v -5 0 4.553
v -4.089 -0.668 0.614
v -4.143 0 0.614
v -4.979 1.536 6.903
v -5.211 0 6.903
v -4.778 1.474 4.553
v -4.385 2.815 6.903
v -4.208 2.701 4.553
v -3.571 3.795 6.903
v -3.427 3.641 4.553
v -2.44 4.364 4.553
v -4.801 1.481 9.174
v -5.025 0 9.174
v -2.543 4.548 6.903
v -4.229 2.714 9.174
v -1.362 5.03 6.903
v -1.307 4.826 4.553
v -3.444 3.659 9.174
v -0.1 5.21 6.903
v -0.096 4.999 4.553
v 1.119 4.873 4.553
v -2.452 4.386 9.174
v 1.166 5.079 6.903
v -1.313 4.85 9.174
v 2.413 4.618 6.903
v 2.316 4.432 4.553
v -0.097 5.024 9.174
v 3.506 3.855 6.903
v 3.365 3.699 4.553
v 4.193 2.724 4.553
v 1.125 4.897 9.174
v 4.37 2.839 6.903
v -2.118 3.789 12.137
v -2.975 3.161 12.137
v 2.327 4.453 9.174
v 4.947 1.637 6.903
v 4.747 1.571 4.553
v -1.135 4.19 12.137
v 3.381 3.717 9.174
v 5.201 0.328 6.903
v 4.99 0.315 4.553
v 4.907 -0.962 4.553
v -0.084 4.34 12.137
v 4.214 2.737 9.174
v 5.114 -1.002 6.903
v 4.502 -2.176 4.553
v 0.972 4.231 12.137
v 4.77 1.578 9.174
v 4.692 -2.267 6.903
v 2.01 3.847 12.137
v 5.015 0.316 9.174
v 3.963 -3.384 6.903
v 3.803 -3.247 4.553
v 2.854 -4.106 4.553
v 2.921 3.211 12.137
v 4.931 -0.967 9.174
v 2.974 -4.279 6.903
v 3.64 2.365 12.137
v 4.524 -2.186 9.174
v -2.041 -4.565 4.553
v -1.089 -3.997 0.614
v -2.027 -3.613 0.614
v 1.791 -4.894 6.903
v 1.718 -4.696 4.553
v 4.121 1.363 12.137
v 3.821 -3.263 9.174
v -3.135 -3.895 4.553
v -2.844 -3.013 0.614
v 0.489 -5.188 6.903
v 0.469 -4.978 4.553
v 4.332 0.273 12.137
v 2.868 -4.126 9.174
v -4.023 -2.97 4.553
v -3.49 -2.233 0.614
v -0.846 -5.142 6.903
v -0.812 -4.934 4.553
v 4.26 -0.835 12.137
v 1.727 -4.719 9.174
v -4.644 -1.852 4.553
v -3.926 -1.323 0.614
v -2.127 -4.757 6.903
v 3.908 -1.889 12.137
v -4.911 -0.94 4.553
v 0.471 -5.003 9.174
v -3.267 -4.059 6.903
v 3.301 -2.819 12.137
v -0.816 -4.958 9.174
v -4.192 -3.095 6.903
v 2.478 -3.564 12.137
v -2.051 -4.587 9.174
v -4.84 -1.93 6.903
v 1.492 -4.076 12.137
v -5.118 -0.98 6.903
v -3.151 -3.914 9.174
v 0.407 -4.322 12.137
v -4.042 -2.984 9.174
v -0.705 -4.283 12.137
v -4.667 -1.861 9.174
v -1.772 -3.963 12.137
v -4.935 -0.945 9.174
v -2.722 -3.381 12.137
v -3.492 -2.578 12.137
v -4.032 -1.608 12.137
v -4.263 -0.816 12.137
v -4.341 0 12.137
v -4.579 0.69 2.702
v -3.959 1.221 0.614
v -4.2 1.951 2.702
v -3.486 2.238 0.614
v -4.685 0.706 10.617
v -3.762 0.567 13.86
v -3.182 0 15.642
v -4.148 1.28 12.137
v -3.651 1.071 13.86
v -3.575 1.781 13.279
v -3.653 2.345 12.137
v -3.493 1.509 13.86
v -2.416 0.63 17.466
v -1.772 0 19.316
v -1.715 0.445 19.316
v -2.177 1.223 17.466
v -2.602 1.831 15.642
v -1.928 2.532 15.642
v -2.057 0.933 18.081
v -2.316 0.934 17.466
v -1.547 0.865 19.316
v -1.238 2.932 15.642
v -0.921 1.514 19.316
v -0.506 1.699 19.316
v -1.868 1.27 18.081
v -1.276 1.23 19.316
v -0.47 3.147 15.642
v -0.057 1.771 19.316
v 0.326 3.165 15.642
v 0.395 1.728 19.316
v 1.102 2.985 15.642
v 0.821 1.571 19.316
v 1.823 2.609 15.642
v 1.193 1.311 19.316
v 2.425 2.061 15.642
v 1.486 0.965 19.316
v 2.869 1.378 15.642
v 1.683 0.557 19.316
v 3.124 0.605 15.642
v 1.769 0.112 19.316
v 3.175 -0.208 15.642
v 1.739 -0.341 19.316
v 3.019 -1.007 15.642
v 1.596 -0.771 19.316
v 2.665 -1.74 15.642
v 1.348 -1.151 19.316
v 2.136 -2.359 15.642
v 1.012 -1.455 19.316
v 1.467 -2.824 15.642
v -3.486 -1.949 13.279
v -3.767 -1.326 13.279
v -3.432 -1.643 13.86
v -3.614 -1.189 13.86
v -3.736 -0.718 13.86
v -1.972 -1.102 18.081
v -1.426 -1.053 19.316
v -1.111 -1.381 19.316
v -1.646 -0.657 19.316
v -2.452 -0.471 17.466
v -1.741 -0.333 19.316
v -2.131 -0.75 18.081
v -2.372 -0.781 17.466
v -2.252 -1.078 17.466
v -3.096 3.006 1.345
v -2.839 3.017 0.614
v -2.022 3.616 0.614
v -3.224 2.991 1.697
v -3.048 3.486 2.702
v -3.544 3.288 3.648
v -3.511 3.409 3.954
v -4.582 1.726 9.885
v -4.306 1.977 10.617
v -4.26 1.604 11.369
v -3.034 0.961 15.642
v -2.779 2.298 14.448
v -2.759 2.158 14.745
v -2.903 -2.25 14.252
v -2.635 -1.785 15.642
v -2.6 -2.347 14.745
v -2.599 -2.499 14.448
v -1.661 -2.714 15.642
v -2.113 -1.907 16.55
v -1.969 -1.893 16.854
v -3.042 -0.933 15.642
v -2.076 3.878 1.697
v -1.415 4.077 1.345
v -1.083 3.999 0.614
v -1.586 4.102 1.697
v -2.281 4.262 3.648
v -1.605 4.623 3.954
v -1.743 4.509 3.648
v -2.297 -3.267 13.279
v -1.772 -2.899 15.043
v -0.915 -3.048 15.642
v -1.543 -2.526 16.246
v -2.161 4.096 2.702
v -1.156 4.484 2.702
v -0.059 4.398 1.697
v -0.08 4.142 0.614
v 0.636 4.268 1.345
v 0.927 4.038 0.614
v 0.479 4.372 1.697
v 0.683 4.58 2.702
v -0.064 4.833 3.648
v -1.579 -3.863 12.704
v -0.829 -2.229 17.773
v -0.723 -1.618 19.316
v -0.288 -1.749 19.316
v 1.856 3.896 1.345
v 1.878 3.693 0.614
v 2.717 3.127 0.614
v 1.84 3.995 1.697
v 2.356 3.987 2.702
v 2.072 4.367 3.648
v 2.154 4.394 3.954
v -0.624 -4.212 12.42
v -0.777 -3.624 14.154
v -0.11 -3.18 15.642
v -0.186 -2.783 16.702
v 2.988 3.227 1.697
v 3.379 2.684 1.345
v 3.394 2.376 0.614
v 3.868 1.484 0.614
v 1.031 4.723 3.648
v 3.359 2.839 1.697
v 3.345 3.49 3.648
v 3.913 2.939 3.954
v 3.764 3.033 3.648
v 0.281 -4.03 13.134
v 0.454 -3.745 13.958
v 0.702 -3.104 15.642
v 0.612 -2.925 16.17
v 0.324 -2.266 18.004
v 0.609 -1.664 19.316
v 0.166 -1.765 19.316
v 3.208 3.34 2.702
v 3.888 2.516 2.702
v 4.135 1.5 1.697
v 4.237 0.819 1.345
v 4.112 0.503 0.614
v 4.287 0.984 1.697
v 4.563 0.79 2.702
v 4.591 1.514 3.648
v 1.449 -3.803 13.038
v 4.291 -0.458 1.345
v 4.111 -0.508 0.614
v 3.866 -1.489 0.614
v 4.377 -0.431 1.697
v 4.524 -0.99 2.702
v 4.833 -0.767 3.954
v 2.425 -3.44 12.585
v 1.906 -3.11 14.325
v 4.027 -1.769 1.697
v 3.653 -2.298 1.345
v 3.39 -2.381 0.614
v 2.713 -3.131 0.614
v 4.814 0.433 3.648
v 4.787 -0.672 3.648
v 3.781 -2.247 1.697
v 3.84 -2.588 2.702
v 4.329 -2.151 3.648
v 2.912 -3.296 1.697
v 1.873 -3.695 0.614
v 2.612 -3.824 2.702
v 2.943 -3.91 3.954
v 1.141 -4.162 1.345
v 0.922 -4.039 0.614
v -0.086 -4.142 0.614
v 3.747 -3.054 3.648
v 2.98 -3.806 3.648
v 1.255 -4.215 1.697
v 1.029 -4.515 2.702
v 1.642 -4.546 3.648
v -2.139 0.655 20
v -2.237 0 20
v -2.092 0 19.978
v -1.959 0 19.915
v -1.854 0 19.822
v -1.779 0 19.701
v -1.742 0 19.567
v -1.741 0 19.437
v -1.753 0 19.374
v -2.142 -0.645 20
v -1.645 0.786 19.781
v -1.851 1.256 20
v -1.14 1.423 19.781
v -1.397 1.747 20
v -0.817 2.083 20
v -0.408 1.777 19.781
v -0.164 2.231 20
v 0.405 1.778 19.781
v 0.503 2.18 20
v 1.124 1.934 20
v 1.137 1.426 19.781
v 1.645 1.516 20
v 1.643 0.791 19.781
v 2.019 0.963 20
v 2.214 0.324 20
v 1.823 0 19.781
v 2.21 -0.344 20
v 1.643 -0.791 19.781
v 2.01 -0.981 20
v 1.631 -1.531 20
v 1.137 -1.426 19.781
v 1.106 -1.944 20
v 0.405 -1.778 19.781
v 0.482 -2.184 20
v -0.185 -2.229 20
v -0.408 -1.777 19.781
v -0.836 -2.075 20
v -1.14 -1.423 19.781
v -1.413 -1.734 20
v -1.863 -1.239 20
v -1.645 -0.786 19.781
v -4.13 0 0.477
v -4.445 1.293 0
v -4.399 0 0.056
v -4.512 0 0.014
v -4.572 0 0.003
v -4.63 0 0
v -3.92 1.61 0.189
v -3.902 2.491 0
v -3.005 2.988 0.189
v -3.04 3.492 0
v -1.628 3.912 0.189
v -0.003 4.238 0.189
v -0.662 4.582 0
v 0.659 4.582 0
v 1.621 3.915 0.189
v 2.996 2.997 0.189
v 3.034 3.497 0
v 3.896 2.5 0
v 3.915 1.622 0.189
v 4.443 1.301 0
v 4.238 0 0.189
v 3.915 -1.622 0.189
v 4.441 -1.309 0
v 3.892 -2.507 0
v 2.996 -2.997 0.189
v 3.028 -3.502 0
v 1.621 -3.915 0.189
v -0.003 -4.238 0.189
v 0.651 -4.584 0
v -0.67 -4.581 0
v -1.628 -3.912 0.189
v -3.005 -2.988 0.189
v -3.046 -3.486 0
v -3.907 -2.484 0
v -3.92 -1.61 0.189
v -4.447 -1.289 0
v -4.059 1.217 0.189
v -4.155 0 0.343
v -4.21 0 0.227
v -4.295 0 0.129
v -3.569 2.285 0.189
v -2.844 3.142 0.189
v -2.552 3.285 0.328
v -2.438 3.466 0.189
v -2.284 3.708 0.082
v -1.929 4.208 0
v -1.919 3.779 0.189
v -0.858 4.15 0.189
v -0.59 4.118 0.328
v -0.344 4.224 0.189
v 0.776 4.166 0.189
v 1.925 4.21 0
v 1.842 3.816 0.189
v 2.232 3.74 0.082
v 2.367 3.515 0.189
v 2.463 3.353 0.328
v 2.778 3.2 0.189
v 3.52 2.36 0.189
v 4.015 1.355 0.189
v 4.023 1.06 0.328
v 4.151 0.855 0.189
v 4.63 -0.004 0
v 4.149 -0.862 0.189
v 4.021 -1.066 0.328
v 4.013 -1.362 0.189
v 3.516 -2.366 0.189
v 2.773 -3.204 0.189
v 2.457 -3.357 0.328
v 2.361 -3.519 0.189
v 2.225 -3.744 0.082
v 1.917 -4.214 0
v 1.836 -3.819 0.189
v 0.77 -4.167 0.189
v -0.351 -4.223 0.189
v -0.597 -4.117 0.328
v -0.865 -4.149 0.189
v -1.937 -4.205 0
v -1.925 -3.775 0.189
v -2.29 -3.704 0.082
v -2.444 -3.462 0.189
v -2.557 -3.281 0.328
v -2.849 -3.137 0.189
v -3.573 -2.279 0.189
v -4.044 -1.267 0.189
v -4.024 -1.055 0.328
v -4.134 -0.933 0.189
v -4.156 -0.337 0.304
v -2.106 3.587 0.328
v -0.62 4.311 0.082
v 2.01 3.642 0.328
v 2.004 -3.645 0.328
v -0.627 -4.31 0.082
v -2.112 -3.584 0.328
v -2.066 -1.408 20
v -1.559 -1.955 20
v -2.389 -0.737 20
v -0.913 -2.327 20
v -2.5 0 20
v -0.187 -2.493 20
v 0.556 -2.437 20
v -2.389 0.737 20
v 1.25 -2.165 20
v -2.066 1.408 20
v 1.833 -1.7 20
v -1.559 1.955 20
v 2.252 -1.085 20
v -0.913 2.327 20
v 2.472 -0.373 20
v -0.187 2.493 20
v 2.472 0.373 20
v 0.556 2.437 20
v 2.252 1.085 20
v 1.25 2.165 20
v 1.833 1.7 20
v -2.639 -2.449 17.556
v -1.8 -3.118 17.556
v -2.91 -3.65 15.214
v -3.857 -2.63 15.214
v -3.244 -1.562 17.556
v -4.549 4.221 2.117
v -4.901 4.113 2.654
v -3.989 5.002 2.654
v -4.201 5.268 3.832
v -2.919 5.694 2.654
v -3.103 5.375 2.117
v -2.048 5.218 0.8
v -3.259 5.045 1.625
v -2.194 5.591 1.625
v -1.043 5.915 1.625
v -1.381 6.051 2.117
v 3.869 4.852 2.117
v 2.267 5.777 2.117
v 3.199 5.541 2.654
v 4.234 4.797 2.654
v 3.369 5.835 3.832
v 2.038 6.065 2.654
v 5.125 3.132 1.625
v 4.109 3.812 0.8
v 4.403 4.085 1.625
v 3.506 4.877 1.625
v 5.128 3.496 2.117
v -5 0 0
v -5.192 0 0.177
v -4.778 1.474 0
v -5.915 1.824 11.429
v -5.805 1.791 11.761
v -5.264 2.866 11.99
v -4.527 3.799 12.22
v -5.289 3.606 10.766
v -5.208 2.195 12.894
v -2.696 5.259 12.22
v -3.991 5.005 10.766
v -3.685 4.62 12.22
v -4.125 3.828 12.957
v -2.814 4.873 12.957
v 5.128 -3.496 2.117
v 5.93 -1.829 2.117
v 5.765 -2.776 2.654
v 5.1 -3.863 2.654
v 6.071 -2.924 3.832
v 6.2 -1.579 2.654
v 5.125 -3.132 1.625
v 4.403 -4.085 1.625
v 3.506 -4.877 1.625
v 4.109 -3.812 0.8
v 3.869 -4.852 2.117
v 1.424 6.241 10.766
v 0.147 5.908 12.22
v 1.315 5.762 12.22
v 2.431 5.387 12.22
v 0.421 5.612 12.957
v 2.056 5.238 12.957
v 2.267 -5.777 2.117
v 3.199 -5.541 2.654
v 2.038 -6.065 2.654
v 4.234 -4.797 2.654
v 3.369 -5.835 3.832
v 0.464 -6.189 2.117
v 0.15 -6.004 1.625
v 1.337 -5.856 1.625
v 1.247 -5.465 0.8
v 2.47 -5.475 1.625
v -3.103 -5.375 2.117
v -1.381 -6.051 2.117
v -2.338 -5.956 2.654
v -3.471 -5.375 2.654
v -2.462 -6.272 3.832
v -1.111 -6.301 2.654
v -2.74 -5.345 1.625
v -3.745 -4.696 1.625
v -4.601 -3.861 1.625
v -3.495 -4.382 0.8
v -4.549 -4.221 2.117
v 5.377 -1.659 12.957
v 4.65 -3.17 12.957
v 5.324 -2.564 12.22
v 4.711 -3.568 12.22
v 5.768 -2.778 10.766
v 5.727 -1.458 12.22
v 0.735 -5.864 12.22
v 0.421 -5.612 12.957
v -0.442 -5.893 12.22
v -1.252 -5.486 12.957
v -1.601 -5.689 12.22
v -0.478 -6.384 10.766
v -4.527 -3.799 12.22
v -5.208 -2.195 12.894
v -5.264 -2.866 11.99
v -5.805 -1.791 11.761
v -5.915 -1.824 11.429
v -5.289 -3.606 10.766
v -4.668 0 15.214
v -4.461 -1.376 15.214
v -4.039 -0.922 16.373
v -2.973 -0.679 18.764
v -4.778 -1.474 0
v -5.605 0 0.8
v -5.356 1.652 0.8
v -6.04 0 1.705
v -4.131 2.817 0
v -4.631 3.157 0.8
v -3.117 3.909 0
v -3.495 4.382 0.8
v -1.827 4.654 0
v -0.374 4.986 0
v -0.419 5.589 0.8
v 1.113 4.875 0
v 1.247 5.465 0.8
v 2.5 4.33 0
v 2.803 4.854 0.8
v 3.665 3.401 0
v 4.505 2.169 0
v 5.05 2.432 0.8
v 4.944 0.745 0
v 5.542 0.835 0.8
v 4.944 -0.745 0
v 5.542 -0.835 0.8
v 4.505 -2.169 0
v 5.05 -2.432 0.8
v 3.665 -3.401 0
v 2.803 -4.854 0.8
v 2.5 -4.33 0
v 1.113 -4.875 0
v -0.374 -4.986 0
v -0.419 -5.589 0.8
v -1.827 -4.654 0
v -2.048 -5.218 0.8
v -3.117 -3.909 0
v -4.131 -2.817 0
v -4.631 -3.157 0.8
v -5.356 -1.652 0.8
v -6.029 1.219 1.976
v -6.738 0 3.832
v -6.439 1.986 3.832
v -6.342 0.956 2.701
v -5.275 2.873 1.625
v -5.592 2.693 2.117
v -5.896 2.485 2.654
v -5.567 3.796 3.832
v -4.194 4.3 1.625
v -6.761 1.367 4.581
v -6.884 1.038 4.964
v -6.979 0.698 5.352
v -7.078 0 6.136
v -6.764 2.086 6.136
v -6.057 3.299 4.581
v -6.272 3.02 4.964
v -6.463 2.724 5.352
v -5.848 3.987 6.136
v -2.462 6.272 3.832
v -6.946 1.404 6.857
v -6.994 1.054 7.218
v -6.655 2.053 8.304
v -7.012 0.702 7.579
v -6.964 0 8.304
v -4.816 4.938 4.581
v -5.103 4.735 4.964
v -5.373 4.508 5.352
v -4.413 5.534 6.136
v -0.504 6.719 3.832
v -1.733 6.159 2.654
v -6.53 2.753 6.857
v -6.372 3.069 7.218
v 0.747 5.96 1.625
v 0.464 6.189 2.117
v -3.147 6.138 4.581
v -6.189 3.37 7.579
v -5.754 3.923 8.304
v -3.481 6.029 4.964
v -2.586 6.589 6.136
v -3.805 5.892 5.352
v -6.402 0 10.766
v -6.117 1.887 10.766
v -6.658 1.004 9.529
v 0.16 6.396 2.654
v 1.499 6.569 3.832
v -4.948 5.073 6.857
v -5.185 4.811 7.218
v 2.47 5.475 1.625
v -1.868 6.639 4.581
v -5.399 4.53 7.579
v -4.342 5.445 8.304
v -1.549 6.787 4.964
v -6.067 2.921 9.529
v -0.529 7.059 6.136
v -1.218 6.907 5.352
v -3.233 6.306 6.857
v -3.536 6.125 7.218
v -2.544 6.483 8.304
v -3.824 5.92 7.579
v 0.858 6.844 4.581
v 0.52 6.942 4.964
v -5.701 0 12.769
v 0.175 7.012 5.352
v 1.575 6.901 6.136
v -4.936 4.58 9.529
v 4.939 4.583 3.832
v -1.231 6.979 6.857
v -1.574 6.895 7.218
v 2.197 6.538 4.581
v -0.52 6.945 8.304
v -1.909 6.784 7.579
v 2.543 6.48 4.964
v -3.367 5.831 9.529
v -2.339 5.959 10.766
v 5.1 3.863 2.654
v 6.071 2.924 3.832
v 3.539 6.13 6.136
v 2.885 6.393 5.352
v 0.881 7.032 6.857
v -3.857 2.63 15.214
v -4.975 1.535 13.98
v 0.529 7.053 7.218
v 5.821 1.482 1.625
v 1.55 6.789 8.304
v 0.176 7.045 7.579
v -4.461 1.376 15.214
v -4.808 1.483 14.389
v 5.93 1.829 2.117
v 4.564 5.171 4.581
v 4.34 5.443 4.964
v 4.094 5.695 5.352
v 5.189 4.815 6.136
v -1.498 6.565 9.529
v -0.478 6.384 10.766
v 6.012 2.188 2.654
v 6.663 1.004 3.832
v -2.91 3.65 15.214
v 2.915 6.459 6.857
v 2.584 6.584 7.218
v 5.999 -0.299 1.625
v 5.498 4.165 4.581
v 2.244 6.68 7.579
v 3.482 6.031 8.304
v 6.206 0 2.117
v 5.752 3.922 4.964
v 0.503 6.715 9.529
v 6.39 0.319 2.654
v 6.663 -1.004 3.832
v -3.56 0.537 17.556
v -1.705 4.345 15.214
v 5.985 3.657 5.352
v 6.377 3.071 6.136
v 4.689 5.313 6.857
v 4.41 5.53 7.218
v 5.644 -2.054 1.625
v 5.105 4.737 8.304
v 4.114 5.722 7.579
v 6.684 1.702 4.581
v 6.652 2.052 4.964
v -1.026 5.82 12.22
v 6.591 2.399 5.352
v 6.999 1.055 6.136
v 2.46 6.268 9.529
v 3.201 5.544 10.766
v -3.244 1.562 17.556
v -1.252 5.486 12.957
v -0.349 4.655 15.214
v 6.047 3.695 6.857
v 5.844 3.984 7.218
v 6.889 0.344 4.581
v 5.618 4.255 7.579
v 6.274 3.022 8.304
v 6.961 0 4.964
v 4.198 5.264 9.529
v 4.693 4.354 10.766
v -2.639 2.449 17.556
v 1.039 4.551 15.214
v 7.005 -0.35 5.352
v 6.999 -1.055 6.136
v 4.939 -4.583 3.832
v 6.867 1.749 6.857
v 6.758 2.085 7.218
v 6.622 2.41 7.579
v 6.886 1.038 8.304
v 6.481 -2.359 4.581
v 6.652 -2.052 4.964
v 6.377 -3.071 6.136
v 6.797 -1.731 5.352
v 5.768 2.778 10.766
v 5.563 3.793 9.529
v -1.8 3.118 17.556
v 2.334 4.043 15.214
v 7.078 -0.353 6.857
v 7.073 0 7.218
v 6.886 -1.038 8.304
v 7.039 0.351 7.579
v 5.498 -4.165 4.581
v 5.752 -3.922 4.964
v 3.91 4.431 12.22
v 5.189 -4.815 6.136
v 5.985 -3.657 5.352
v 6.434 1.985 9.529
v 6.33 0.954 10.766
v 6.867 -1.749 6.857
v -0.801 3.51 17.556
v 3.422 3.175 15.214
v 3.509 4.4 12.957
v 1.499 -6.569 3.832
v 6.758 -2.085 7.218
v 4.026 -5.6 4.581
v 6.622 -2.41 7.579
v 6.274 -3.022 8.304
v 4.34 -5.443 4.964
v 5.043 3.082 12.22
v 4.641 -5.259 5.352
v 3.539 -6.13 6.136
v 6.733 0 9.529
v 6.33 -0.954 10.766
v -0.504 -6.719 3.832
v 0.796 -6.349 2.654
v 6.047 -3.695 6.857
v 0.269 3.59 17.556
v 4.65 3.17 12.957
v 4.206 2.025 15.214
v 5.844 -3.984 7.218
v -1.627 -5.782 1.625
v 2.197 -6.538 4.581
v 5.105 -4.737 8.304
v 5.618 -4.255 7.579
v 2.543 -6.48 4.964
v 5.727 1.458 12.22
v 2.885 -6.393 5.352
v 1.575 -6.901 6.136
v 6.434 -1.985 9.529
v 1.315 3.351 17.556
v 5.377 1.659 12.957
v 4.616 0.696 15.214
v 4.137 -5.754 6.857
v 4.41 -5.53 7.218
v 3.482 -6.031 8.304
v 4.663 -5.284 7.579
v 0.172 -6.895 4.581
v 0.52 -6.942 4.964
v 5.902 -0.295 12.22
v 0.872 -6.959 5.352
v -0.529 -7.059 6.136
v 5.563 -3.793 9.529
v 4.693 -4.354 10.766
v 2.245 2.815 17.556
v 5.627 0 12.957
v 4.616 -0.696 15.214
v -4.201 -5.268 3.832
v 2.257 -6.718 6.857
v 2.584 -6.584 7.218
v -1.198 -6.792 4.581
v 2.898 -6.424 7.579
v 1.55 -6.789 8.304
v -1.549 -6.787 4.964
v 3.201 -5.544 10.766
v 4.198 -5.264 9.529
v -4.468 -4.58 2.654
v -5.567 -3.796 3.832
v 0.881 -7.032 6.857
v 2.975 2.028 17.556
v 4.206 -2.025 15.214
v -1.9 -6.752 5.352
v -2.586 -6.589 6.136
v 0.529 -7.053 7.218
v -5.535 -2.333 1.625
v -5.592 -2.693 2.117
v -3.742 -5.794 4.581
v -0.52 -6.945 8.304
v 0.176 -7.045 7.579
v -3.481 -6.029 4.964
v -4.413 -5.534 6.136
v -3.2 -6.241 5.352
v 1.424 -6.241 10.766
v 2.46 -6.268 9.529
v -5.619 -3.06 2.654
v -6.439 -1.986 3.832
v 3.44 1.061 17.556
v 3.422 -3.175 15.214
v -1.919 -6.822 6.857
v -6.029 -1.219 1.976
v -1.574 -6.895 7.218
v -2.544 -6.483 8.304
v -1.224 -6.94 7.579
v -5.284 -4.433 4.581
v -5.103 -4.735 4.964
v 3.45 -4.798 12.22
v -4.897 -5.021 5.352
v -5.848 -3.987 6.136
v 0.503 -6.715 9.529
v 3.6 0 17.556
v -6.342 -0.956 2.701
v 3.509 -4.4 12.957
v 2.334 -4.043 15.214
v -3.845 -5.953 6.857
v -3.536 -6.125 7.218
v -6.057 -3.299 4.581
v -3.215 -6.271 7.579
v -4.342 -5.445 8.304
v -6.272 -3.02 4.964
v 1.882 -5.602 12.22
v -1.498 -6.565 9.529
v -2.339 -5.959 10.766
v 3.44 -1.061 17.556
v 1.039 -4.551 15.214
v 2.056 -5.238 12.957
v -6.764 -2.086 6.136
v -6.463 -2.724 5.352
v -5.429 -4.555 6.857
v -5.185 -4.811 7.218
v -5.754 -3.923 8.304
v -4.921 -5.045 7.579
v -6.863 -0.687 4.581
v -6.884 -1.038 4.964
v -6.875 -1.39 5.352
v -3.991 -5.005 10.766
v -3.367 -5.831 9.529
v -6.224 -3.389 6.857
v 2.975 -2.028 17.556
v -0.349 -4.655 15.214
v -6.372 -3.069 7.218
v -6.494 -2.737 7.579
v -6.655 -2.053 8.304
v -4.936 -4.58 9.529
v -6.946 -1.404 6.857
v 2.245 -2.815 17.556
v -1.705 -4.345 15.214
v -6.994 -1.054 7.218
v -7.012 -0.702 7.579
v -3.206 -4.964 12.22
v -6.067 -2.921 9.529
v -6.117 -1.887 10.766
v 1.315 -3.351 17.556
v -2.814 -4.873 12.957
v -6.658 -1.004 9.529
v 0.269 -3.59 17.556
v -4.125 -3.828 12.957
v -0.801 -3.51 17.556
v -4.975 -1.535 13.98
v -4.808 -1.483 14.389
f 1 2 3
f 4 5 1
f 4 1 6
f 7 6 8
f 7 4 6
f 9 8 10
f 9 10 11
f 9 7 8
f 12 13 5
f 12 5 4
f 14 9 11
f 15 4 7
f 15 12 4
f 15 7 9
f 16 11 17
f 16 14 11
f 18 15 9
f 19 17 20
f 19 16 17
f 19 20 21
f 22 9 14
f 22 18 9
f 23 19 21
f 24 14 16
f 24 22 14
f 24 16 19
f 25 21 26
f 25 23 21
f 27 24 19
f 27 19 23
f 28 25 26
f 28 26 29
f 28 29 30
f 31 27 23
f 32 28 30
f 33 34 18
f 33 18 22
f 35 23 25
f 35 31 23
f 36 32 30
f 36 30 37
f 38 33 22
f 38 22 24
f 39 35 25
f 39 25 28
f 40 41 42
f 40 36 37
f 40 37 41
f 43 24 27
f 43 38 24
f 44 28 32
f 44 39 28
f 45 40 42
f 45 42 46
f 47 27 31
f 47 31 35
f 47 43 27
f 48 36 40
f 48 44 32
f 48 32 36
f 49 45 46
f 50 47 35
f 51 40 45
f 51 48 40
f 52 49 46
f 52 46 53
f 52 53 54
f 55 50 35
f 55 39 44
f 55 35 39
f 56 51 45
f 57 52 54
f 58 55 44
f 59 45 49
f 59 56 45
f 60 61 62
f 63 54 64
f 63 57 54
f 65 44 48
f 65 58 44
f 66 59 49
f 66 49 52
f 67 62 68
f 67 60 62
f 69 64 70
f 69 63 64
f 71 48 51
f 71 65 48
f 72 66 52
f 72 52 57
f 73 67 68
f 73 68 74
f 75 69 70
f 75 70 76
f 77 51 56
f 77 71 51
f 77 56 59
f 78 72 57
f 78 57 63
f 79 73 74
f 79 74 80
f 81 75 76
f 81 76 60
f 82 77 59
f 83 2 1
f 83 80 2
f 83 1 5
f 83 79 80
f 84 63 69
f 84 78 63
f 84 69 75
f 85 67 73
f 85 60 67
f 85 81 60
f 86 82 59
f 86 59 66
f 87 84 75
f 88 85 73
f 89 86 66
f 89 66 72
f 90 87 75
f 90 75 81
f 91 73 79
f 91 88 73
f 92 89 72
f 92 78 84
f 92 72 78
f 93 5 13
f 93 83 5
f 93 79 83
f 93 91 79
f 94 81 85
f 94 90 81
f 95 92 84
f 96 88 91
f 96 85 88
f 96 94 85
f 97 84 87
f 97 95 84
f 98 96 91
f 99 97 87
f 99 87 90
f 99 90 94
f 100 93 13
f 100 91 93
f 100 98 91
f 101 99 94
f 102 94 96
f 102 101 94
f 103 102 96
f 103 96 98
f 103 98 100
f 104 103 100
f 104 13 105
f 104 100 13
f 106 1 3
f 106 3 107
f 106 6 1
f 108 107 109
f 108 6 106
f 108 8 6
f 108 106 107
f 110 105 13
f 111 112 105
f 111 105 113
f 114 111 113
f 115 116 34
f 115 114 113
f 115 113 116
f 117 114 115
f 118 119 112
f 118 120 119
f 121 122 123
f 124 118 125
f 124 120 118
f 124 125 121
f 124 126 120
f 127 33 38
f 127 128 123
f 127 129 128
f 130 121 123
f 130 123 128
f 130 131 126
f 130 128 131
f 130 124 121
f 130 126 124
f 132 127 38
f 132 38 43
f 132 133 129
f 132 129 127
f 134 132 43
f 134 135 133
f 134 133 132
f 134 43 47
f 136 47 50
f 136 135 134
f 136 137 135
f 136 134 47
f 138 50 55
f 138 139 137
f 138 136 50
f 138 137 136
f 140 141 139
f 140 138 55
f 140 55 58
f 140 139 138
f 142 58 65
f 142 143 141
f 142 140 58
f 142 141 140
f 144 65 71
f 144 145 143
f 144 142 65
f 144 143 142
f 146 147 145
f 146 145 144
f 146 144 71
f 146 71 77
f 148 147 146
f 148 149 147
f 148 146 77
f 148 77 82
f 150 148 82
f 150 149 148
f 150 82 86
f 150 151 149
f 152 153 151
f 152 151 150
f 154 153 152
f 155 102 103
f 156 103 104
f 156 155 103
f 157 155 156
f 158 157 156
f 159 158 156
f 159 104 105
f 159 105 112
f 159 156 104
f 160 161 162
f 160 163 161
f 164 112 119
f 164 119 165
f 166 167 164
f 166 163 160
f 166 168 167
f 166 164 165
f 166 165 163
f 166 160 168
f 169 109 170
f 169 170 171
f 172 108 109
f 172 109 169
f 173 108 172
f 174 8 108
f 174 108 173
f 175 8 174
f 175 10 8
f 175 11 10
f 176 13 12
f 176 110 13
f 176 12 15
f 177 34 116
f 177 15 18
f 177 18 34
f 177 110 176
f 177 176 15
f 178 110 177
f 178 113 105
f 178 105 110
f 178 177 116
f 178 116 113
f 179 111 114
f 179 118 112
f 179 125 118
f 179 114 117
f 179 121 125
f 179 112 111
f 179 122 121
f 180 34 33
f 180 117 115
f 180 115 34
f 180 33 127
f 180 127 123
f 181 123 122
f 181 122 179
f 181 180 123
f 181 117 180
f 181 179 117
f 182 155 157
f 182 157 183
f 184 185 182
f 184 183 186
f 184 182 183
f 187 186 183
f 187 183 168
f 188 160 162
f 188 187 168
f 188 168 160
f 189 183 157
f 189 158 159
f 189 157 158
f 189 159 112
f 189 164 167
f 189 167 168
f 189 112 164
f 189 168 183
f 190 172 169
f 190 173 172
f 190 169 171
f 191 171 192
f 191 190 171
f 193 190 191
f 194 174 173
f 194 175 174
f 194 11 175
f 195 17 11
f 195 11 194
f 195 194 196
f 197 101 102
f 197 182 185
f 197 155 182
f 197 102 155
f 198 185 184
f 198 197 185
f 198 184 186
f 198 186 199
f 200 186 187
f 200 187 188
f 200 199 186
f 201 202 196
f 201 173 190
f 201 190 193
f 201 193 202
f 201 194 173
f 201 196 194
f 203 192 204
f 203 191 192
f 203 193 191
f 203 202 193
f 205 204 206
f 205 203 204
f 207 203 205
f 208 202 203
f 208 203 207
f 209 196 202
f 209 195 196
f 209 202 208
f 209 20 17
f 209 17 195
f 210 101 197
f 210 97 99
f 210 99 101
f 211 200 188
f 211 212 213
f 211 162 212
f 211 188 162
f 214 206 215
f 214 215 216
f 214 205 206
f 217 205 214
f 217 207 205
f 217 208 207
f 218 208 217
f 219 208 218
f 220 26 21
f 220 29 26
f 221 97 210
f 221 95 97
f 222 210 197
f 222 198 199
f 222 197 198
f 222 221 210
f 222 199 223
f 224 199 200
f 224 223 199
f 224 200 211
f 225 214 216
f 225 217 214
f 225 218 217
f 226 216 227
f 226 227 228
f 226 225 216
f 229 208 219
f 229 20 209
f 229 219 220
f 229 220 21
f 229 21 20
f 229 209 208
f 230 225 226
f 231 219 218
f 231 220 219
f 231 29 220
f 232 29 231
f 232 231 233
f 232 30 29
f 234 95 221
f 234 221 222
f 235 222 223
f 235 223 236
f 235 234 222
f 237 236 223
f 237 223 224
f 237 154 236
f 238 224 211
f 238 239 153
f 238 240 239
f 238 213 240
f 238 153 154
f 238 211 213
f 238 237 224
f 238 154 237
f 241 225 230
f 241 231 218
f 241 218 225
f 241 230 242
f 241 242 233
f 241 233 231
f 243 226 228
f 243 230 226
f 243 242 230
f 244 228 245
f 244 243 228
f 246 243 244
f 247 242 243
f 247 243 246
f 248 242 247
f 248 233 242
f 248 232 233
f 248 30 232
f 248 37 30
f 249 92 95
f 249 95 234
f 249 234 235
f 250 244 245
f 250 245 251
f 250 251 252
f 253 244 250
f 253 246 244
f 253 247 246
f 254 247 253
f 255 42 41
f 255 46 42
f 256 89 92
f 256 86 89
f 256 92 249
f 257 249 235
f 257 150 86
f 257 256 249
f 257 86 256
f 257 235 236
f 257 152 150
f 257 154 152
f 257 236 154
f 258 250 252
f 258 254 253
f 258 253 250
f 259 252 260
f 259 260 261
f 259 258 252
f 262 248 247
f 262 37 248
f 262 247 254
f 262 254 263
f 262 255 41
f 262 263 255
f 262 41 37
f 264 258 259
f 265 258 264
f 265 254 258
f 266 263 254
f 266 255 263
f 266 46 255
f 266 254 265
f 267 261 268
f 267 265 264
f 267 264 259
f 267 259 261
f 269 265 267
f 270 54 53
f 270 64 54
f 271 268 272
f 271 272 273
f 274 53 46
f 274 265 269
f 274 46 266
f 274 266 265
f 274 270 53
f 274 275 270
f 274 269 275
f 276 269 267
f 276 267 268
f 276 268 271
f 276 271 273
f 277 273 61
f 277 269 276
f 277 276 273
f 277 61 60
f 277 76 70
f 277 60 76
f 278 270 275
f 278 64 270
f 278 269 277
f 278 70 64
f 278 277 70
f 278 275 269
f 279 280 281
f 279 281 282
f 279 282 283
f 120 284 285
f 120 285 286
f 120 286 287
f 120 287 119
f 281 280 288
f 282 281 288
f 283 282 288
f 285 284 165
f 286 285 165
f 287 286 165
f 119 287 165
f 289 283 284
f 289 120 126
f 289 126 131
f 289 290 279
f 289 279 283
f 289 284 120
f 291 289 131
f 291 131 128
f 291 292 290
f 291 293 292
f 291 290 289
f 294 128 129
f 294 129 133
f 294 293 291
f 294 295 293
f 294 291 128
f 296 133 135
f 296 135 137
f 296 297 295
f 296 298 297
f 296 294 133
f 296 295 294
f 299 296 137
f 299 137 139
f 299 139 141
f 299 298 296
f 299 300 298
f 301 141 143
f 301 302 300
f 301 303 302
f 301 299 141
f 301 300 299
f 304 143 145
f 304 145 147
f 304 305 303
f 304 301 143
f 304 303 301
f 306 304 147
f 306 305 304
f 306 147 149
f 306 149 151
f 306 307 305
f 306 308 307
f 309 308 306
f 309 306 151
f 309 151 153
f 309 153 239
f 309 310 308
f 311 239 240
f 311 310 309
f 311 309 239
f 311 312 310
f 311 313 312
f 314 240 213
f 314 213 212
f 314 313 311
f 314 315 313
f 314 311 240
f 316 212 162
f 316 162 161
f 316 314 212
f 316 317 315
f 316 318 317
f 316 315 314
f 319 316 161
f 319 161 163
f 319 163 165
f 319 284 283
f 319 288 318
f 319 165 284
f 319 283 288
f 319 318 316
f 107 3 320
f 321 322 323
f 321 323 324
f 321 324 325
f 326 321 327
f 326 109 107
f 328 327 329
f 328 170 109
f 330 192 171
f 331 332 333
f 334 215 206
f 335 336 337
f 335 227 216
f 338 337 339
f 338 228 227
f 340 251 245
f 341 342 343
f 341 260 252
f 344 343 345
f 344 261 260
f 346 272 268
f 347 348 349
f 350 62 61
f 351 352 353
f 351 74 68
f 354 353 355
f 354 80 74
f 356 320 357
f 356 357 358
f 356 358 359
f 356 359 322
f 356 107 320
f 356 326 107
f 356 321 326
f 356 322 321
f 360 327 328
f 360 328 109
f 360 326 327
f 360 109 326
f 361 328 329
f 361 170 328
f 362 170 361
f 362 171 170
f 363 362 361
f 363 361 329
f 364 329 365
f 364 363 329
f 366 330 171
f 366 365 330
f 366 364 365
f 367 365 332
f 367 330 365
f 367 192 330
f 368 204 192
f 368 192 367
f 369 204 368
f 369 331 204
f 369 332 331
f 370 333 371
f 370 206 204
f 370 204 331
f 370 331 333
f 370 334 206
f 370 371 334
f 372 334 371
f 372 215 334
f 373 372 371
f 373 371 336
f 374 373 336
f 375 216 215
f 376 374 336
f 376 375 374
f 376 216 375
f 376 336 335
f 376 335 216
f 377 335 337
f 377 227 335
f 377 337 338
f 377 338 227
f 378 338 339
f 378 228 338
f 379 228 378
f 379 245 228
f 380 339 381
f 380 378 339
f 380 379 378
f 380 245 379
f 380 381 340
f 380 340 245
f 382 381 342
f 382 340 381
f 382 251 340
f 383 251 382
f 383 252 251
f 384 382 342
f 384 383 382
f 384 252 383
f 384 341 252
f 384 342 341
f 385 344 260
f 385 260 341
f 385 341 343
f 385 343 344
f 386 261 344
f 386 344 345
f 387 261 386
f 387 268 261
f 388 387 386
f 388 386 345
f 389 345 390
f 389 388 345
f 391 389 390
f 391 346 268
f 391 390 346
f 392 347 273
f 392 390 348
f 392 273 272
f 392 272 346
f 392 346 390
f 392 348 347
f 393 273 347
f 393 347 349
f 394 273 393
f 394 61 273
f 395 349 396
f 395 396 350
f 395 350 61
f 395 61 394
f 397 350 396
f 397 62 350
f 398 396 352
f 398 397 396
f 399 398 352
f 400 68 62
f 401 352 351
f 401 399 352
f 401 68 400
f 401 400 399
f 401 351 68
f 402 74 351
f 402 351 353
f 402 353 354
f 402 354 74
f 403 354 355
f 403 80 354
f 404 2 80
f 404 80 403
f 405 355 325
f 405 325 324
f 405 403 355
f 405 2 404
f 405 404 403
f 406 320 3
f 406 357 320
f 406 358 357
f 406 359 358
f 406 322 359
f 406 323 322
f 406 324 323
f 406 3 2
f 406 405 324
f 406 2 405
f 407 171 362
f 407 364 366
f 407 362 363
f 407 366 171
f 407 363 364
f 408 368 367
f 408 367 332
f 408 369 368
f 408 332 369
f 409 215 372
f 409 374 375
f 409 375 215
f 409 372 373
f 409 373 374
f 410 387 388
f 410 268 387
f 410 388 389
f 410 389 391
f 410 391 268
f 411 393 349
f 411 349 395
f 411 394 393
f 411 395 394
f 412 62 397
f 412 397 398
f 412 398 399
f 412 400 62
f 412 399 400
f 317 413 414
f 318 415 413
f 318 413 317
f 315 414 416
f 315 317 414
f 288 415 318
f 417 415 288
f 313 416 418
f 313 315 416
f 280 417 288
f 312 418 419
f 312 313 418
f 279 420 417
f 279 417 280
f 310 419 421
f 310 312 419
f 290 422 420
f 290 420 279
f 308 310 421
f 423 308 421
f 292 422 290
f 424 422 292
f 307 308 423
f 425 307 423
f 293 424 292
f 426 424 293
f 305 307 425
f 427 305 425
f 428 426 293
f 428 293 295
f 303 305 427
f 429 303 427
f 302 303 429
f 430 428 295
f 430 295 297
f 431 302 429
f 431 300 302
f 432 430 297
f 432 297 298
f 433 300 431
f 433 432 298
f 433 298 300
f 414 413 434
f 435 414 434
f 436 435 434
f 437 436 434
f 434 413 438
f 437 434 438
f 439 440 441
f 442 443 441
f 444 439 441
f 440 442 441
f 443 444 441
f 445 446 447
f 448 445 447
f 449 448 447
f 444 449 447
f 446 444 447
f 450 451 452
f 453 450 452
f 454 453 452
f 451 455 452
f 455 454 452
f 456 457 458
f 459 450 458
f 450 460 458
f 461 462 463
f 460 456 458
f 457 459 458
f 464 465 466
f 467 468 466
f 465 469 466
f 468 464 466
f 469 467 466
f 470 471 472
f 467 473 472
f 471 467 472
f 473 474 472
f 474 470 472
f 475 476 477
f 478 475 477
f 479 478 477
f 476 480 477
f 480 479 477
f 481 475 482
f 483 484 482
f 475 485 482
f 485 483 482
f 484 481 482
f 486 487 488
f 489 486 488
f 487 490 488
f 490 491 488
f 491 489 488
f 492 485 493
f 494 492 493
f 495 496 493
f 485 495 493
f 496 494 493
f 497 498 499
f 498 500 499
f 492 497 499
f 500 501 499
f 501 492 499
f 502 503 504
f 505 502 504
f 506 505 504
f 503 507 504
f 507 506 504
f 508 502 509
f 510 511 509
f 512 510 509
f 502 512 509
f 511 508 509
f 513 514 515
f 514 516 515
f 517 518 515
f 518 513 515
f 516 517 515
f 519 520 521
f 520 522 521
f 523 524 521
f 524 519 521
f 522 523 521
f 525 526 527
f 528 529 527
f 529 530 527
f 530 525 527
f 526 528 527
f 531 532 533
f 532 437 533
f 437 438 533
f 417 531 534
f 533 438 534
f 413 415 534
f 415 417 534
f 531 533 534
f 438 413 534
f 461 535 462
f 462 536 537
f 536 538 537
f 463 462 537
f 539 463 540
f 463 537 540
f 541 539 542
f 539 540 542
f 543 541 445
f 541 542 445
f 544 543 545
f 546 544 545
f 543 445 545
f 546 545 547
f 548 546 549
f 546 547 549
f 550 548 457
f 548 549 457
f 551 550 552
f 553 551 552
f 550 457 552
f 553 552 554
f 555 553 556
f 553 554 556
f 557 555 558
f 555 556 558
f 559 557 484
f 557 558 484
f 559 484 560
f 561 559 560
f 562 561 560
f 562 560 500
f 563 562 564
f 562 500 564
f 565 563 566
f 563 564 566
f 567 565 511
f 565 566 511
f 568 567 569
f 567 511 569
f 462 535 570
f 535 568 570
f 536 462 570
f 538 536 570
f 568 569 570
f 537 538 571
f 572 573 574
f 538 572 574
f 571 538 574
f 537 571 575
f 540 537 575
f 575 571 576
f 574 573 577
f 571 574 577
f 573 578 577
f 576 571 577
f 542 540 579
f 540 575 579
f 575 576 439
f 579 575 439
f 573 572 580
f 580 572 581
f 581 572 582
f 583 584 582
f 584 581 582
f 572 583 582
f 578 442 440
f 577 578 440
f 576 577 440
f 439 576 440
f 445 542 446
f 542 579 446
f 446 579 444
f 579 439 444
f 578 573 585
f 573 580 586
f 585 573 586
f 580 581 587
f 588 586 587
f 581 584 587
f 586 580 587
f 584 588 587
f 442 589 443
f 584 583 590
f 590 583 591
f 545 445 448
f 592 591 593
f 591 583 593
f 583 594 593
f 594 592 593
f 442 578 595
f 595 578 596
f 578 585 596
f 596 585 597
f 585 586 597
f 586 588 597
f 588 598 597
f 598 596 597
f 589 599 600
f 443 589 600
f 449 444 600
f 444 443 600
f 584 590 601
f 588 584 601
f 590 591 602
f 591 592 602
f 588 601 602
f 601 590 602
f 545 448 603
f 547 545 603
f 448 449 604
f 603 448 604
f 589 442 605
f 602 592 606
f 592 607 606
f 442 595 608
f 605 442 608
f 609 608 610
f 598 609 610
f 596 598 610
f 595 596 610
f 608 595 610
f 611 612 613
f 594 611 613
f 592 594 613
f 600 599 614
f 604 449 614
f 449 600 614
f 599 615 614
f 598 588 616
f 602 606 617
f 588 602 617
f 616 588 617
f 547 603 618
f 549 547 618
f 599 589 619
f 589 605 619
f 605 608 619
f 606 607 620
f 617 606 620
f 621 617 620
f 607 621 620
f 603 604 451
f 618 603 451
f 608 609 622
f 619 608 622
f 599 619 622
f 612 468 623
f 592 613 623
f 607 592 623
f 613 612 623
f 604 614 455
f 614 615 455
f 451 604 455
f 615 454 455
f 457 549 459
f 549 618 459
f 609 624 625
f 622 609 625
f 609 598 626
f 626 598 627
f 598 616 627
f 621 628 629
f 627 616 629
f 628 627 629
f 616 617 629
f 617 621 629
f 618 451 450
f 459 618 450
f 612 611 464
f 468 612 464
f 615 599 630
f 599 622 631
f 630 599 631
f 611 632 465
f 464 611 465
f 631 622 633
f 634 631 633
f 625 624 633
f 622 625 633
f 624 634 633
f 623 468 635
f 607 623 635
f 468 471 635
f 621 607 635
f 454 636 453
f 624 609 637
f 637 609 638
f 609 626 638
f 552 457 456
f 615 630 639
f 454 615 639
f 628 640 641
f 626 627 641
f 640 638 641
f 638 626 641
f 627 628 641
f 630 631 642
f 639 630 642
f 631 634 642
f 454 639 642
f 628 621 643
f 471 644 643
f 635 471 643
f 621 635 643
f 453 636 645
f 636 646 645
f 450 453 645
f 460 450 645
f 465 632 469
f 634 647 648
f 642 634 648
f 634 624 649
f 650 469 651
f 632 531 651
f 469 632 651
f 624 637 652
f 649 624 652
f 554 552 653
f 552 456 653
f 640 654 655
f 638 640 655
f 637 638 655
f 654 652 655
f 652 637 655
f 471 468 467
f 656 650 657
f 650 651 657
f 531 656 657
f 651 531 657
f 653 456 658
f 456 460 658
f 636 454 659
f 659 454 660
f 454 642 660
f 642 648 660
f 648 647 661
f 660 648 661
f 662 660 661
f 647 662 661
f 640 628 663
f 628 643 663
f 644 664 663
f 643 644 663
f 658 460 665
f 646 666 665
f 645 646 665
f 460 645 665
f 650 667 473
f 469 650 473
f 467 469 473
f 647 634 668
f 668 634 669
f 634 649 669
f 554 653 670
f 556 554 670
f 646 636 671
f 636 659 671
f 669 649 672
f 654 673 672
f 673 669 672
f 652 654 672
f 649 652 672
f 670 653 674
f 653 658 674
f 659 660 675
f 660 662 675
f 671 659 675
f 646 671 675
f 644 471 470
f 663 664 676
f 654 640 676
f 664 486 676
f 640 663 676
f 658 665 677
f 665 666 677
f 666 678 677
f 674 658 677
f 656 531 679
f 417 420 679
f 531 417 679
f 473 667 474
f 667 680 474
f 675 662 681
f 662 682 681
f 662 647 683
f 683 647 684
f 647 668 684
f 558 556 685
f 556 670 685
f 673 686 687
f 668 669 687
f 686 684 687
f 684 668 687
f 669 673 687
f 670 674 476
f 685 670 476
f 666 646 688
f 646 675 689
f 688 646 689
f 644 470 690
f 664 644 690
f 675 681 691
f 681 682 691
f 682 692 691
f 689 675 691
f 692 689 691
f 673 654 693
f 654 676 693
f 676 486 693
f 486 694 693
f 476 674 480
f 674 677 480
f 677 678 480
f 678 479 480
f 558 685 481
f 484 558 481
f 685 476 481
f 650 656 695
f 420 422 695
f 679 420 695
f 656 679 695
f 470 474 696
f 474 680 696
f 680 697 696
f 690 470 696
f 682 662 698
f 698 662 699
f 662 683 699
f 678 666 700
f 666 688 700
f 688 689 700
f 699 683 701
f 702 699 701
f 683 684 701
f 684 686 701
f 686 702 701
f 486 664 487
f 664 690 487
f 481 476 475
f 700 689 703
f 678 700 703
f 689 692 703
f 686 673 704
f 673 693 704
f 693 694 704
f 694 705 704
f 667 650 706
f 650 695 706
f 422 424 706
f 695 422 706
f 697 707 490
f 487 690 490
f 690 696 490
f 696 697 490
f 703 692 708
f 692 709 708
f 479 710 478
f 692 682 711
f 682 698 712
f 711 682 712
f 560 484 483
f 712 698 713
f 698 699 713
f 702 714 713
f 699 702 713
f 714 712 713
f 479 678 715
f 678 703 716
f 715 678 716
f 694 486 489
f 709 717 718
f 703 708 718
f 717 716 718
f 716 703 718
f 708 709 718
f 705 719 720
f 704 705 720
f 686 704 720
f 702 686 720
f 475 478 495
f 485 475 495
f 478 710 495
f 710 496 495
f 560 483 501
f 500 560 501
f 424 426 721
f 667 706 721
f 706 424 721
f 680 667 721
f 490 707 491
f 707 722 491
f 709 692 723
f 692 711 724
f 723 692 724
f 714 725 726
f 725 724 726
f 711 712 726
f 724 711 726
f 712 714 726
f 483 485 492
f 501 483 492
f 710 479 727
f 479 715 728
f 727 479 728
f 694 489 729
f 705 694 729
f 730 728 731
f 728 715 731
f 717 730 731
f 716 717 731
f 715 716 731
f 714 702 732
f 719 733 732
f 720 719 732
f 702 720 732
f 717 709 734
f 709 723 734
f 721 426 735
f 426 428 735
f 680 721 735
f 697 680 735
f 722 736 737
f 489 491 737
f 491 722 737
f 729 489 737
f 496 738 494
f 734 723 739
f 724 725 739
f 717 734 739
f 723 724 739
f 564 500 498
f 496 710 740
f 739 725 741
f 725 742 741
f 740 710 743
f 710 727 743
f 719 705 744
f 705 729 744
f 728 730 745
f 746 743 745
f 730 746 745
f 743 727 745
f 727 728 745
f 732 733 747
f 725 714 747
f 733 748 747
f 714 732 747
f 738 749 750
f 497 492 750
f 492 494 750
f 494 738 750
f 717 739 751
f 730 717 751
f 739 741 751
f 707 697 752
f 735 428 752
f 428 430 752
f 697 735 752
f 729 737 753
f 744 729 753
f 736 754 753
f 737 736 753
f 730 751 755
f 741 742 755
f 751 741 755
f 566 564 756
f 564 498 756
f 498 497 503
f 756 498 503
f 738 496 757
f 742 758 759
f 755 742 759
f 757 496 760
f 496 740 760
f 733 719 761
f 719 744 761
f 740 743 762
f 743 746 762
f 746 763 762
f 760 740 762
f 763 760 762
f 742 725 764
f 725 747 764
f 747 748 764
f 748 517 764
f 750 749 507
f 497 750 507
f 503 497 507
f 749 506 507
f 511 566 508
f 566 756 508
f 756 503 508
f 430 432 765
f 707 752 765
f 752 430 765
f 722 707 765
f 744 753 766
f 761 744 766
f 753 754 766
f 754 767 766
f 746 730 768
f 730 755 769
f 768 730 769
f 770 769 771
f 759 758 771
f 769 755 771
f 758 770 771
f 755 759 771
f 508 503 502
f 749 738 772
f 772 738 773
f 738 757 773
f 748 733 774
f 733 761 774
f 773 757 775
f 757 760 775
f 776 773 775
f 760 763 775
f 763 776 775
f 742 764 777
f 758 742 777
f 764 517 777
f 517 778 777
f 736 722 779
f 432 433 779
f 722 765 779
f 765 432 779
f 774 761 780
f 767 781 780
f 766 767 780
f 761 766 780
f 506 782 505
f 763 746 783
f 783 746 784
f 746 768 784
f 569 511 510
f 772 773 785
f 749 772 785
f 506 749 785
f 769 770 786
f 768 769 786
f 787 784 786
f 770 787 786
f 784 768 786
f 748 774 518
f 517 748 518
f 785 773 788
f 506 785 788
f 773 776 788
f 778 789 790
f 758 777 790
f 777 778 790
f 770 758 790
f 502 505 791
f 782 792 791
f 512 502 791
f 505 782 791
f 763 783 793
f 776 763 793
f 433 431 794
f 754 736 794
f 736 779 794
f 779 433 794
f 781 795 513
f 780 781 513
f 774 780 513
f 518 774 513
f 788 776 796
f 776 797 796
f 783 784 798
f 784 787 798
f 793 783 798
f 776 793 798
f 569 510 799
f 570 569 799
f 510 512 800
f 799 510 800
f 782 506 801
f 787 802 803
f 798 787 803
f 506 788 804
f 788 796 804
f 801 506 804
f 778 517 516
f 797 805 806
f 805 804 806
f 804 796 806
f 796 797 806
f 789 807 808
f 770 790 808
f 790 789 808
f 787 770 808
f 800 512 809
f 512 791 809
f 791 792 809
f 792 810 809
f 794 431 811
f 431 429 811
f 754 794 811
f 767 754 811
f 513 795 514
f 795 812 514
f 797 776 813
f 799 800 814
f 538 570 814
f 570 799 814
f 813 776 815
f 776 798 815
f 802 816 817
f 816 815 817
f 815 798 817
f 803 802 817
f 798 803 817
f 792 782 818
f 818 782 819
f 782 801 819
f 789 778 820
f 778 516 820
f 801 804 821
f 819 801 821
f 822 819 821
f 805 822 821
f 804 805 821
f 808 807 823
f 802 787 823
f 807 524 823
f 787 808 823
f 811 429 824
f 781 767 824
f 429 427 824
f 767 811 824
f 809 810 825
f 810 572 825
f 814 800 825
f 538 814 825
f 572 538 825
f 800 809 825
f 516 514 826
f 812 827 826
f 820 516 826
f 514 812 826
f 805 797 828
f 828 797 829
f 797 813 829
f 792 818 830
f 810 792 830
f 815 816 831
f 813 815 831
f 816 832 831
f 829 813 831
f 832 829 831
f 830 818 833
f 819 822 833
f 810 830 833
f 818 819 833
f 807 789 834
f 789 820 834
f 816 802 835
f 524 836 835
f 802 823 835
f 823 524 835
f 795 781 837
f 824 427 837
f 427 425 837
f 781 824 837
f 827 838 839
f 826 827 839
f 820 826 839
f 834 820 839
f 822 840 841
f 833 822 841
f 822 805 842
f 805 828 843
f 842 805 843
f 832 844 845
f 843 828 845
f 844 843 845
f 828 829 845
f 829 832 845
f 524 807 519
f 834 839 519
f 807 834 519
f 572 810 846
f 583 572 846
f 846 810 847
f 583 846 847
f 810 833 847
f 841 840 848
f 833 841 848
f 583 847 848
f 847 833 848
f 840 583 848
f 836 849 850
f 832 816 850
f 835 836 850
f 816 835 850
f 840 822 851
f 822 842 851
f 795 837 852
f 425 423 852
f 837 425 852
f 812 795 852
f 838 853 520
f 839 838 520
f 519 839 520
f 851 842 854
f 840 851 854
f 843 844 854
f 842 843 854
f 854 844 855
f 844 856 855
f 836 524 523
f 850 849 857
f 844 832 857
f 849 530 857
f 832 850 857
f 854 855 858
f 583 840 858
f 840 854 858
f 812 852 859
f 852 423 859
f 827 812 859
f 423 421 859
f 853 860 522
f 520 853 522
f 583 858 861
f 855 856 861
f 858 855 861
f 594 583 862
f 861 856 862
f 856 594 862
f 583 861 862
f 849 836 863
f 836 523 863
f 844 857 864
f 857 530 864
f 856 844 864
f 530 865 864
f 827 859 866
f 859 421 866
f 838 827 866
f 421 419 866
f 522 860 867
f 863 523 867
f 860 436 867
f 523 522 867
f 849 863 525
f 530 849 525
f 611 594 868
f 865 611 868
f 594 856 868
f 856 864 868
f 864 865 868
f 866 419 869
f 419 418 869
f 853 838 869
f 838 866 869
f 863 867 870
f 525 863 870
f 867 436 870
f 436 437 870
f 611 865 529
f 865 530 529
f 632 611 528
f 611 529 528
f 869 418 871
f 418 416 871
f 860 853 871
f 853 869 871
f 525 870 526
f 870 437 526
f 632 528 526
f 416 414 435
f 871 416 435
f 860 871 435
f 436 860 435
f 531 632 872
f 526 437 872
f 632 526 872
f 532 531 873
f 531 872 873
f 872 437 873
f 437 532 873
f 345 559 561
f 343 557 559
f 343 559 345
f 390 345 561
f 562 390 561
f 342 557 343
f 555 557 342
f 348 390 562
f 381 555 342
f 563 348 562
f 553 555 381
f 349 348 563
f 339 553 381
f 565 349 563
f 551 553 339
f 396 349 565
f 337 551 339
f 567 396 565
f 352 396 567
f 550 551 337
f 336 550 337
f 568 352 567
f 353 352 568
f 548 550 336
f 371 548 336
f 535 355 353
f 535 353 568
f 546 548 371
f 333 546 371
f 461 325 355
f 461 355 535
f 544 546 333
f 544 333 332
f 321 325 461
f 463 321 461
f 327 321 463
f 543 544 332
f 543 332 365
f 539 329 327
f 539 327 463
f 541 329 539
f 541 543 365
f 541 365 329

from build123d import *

# Parameters (mm, degrees)
F2_R = 0.5
F3_R = 0.5


with BuildPart() as f1:
    # F0 (on Front) → F1 (revolve)
    with BuildSketch(Plane.XZ):
        with BuildLine():
            add(Edge.make_bspline(
                [(-5, 0), (-5.568478834, 0.3473942948), (-8.9810832887, 7.5078125566), (-4.7572668768, 14.8222669789), (-2.5, 20)],
                knots=[0, 0, 0, 0, 0.3982454309, 1, 1, 1, 1], degree=3))
            Line((-5, 0), (-4, 0))
            add(Edge.make_bspline(
                [(-4, 0), (-4.7774628776, 3.3785415502), (-6.1811078788, 8.0215420638), (-3.2011788665, 15.7336687939), (-1.5, 20)],
                knots=[0, 0, 0, 0, 0.4495116156, 1, 1, 1, 1], degree=3))
            Line((-1.5, 20), (-2.5, 20))
        make_face()
    revolve(axis=Axis((0, 0, 10), (0, 0, -1)))

    # F2
    f2_edges = [f1.edges().sort_by_distance(p)[0] for p in [
        (1.5, 0, 20),
    ]]
    fillet(f2_edges, radius=F2_R)

    # F3
    f3_edges = [f1.edges().sort_by_distance(p)[0] for p in [
        (4, 0, 0),
    ]]
    fillet(f3_edges, radius=F3_R)


solid = f1.part
